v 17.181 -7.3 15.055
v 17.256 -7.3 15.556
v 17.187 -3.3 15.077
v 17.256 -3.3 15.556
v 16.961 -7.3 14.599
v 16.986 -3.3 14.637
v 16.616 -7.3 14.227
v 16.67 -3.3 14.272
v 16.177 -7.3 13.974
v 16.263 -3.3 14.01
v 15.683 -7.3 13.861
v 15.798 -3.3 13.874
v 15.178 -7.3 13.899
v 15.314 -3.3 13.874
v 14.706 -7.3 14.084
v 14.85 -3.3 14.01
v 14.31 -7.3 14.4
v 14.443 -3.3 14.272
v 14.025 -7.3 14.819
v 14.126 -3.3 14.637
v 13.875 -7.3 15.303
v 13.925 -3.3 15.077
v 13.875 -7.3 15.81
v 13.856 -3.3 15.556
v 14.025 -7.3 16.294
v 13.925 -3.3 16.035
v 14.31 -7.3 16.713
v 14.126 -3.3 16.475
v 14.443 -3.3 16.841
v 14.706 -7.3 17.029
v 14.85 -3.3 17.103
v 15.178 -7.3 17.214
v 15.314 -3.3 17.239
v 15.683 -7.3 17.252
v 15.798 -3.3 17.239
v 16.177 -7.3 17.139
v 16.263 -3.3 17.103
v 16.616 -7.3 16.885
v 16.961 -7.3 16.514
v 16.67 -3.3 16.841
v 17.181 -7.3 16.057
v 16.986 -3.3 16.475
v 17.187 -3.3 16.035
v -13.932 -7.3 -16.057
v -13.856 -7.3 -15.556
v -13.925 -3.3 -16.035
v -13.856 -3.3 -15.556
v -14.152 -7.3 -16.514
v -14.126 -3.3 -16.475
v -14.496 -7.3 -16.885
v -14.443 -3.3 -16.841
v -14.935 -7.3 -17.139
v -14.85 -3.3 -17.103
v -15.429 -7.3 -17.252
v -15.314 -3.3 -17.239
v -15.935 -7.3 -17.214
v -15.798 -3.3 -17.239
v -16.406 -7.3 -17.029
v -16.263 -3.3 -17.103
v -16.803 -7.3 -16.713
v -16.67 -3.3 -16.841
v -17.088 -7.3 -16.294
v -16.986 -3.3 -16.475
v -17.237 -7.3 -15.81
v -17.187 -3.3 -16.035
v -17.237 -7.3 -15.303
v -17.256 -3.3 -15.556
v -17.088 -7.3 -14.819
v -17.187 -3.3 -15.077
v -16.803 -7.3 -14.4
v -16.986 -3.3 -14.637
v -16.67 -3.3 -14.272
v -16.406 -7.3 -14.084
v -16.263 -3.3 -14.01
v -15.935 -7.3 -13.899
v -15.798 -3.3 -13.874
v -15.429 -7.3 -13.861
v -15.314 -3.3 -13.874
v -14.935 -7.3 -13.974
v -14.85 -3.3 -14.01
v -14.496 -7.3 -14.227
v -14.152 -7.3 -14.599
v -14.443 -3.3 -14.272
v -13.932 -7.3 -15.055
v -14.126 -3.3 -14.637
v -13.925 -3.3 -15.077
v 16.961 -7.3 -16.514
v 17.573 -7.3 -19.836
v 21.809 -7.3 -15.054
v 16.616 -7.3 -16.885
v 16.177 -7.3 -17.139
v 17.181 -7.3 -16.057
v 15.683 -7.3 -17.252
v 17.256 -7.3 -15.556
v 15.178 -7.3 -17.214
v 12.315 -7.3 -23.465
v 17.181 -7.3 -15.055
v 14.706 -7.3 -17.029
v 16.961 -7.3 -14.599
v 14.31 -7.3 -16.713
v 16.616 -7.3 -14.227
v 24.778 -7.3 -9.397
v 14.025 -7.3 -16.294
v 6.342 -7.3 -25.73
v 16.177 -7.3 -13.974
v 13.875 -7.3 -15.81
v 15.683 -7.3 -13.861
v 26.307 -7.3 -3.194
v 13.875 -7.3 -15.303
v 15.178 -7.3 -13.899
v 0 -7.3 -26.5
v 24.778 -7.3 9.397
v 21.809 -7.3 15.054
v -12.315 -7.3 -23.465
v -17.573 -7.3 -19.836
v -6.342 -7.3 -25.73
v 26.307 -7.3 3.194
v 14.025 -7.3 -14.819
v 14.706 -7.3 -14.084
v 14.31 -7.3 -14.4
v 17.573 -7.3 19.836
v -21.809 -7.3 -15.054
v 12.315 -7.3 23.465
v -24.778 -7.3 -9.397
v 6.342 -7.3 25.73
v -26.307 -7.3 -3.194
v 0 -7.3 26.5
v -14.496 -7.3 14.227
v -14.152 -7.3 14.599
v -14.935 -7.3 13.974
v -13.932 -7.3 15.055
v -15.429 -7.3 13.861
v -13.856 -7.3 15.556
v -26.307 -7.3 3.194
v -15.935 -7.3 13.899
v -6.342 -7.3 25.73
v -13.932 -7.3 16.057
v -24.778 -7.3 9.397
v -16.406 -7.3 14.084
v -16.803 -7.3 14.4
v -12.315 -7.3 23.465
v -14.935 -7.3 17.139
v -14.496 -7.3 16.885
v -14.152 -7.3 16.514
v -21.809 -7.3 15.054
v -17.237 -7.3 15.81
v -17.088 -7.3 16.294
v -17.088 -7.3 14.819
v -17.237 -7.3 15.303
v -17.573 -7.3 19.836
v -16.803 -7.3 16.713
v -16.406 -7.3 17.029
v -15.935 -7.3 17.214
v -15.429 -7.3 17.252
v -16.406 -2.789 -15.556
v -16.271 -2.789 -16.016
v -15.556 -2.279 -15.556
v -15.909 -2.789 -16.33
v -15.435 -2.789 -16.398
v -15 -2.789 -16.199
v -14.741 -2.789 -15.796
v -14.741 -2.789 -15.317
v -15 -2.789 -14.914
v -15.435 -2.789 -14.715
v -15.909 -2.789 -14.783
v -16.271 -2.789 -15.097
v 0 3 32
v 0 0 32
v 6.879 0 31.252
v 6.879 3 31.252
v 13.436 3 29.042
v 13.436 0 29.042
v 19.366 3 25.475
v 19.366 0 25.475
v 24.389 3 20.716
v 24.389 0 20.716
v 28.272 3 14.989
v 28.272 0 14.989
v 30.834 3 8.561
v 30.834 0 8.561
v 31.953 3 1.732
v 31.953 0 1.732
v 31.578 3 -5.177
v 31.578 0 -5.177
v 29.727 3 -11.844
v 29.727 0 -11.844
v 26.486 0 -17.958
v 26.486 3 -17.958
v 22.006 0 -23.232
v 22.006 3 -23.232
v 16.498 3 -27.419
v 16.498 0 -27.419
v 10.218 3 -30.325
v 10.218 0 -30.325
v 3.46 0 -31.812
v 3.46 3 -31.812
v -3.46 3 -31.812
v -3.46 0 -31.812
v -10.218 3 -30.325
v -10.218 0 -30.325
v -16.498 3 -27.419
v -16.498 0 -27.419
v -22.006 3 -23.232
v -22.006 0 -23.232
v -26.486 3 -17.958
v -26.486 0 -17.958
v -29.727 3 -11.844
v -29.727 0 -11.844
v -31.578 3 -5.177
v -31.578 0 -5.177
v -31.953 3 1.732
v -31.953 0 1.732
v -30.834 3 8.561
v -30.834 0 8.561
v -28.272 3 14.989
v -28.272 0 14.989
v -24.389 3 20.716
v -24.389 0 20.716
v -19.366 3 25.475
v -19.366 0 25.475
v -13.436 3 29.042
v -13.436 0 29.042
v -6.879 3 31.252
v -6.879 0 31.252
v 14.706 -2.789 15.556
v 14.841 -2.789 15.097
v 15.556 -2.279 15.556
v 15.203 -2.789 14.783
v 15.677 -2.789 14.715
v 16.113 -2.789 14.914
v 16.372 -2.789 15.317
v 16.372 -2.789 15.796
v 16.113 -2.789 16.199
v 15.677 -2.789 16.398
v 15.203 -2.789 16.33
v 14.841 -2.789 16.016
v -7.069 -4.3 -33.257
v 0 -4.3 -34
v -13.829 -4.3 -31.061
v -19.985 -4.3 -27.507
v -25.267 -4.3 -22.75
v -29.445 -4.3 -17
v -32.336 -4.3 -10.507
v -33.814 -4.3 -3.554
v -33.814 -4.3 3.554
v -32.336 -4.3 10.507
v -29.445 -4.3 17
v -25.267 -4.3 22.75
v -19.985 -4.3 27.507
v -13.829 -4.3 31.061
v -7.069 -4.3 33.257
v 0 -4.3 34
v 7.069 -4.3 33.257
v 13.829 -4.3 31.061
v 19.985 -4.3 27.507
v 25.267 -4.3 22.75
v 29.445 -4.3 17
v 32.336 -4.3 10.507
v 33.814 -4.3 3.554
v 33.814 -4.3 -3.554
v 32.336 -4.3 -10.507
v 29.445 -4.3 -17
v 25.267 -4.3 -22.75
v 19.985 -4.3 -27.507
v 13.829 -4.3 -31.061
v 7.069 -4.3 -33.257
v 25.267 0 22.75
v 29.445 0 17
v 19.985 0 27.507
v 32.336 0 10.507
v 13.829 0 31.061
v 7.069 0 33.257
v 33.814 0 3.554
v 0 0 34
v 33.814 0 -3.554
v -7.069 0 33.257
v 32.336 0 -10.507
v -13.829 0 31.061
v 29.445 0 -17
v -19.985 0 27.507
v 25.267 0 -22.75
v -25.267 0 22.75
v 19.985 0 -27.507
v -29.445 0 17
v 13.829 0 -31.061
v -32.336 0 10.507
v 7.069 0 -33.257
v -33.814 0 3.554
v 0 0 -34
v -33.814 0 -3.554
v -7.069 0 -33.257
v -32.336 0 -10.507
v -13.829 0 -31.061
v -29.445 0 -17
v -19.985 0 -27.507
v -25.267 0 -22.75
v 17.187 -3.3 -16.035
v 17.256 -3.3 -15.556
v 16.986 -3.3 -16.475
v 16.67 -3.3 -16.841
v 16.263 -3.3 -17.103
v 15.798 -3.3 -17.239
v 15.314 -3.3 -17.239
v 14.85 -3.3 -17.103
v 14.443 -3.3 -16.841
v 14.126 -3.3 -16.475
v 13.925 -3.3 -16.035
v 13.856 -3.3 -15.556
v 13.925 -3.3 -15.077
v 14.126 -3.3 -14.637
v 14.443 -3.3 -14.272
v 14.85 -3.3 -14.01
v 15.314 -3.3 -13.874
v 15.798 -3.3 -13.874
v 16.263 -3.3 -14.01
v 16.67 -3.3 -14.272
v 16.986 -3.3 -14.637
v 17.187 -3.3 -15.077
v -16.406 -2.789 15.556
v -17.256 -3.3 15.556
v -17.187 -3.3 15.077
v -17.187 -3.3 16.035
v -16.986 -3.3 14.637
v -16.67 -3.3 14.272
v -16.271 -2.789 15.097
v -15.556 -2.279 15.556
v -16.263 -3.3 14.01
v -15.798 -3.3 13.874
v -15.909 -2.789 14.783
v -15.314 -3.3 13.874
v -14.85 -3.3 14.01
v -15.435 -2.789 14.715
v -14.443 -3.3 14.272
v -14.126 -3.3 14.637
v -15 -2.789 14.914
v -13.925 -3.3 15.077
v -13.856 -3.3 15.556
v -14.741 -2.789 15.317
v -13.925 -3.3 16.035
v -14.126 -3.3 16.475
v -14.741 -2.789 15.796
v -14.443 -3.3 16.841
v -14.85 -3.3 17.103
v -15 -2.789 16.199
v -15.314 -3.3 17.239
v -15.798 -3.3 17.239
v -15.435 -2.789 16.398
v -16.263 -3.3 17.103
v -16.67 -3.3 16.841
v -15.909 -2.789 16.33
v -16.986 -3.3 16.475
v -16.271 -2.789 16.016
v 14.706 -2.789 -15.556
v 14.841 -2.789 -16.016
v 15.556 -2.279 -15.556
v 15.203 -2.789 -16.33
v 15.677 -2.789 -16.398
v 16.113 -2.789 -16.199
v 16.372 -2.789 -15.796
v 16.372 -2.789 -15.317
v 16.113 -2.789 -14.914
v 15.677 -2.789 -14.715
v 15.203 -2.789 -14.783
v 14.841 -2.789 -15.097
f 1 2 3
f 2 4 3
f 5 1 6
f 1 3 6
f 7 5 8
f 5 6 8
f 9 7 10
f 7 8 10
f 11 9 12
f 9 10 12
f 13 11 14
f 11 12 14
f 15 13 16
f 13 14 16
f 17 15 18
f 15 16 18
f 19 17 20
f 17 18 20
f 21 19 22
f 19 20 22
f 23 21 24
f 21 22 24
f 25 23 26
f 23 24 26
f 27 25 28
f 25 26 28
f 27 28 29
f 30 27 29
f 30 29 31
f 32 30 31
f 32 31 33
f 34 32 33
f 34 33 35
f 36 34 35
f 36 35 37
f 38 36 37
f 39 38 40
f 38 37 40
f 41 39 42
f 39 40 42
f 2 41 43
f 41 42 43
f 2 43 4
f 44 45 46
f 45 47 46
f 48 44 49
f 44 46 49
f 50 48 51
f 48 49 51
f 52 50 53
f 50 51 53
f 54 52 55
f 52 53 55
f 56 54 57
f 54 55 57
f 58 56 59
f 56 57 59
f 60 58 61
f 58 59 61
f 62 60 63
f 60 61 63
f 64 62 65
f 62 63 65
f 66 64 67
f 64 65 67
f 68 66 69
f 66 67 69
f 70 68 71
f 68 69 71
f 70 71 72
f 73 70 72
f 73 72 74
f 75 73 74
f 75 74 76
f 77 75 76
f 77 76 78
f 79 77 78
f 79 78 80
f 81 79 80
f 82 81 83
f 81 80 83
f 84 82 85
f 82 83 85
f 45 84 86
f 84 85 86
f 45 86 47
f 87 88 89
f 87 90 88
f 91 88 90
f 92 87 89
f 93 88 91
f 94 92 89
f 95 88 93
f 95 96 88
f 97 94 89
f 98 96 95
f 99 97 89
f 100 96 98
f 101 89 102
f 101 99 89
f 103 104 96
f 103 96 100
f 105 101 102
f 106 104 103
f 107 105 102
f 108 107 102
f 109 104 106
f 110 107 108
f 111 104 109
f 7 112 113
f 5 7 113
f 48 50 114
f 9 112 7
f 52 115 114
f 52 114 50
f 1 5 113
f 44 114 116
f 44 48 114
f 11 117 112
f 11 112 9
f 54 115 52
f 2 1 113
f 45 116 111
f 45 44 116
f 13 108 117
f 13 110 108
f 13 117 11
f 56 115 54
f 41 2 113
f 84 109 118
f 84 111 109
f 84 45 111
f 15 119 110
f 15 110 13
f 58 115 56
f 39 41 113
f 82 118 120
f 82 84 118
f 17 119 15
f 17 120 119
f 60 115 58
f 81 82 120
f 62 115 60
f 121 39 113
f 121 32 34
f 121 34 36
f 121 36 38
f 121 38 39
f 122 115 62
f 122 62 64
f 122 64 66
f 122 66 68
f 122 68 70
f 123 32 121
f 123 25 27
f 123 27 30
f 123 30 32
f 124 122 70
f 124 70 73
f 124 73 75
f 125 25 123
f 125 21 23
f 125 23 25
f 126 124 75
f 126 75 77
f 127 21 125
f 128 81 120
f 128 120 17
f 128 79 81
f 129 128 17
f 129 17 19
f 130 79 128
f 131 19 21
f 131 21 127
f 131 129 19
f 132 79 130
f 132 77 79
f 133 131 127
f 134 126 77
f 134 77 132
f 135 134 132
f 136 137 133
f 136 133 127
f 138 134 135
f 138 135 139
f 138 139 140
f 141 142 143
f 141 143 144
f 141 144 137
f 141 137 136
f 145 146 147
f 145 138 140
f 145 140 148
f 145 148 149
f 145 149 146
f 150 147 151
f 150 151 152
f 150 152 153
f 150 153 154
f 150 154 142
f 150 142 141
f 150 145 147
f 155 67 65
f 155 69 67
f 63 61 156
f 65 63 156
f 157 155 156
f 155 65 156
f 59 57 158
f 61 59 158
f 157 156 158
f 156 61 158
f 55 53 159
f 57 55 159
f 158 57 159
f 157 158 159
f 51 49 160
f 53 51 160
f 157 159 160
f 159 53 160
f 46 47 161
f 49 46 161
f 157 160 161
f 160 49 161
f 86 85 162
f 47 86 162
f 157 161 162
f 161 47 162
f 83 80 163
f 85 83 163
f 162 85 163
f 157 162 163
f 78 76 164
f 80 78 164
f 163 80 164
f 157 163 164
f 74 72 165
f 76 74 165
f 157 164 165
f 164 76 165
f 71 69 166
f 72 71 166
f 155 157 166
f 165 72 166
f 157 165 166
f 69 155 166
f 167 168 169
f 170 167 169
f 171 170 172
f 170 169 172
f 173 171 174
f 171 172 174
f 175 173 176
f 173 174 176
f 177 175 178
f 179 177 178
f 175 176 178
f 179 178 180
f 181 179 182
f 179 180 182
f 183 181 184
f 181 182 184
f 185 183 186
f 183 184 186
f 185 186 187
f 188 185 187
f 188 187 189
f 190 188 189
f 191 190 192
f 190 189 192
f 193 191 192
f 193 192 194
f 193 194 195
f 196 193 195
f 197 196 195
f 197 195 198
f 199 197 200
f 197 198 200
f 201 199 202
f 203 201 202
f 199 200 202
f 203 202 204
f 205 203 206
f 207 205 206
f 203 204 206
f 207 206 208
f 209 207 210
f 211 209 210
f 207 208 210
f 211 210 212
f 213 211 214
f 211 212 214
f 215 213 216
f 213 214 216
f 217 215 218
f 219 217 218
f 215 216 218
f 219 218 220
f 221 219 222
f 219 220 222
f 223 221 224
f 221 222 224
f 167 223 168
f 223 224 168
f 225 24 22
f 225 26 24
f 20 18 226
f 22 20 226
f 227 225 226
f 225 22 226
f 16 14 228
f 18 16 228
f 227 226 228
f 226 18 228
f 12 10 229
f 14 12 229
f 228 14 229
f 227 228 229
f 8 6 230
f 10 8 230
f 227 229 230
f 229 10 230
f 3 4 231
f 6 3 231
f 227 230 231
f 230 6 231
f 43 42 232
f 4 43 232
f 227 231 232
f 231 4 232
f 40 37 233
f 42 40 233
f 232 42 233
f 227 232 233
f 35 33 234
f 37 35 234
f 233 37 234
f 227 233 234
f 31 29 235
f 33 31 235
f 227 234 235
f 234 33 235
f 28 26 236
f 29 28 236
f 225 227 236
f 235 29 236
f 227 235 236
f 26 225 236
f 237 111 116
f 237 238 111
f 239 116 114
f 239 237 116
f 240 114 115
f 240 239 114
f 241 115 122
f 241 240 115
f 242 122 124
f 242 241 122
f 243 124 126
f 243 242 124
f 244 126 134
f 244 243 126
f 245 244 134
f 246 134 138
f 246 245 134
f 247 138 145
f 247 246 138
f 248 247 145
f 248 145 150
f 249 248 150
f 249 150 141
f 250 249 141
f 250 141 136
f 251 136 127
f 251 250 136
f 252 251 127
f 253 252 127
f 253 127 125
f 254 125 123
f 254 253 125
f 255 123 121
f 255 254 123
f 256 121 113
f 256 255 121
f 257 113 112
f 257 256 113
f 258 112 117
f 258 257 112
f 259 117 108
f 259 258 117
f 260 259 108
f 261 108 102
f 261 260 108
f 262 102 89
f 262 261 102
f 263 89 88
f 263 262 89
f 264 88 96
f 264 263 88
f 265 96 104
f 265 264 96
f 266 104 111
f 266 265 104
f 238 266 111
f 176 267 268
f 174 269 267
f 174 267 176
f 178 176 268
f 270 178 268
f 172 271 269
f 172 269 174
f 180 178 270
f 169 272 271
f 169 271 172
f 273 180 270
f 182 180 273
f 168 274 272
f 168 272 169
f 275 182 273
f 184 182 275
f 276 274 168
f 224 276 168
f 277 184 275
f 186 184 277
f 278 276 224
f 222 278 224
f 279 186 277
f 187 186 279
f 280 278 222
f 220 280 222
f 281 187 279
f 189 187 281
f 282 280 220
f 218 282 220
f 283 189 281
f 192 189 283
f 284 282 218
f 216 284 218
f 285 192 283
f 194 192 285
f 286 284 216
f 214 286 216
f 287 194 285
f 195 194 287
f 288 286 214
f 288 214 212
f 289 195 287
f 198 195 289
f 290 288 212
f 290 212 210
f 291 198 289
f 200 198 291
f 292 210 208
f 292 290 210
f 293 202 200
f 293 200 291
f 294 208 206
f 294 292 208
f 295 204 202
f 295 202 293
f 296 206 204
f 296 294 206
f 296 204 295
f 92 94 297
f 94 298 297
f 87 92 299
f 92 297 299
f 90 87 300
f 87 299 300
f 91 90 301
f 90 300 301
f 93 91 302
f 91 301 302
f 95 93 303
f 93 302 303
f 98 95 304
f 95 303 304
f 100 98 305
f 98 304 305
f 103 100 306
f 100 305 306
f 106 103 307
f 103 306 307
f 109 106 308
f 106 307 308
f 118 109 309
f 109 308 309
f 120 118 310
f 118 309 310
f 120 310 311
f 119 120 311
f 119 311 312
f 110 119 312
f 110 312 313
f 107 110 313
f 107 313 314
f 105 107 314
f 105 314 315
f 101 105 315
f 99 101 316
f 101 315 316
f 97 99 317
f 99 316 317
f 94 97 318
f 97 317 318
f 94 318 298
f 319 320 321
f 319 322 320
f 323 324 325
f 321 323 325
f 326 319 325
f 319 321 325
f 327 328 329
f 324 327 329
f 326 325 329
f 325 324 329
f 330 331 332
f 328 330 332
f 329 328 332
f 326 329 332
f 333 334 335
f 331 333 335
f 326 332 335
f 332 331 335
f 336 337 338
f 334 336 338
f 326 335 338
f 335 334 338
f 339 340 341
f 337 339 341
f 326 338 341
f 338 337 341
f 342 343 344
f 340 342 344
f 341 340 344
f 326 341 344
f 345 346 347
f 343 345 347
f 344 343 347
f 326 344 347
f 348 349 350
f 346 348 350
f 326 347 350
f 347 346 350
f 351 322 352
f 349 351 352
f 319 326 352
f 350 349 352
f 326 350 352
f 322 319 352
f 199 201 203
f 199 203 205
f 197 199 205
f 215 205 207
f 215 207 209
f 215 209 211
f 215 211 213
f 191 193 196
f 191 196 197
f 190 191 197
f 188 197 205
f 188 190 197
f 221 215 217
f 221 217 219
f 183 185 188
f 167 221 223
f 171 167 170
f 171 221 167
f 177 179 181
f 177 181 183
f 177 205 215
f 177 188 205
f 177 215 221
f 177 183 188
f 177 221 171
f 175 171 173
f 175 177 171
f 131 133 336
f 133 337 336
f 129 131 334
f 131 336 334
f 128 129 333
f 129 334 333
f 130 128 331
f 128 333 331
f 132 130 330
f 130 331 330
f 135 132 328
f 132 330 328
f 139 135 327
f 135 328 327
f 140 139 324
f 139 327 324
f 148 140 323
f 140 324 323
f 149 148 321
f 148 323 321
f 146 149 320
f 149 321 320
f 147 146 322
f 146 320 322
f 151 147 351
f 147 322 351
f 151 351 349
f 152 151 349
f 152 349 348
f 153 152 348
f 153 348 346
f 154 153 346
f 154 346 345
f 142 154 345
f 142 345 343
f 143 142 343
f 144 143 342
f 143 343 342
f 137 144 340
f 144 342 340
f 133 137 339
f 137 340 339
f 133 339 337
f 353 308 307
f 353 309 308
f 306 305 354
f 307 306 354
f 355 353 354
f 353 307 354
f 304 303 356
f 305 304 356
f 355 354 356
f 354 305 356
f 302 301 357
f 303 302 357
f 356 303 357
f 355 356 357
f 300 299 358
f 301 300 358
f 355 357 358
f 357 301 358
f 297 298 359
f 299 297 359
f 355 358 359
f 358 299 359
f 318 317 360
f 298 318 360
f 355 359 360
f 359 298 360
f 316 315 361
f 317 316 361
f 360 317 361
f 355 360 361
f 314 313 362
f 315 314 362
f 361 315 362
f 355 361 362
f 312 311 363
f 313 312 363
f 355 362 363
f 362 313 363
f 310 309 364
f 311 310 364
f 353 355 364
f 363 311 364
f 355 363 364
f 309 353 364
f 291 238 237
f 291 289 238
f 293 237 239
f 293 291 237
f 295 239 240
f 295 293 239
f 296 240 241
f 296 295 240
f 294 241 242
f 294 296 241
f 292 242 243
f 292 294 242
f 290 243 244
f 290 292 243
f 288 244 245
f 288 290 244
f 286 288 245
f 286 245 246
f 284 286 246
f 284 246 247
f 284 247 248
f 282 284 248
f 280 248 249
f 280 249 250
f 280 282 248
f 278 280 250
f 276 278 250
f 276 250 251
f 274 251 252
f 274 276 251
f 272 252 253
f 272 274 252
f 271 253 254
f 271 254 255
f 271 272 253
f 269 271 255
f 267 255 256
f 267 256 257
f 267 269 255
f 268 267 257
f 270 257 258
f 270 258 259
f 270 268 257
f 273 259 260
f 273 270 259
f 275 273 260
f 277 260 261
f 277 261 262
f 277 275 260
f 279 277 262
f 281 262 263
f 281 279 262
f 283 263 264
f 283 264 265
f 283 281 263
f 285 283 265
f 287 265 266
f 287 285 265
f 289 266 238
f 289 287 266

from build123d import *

# Parameters (mm, degrees)
SKETCH2_R                = 32
BOSS_EXTRUDE1_DEPTH      = 3
M3_CLEARANCE_HOLE1_D     = 3.4
M3_CLEARANCE_HOLE1_DEPTH = 4
M3_CLEARANCE_HOLE1_TIP   = 1.021463052


with BuildPart() as part:
    # Sketch1 → Revolve1 (revolve)
    with BuildSketch(Plane.XY, mode=Mode.PRIVATE) as revolve1_sk:
        Polygon((-26.5, -7.3), (-34, -4.3), (-34, 0), (0, 0), (0, -7.3), align=None)
    revolve(revolve1_sk.sketch.rotate(Axis((0, -7.3, 0), (0, 1, 0)), 270), axis=Axis((0, -7.3, 0), (0, 1, 0)))

    # Sketch2 → Boss-Extrude1 (add)
    with BuildSketch(Plane(origin=(0, 0, 0), x_dir=(1, 0, 0), z_dir=(0, 1, 0))):
        with Locations(Location((0, 0, 0), (0, 0, 270))):
            Circle(SKETCH2_R)
    extrude(amount=BOSS_EXTRUDE1_DEPTH)

    # M3 Clearance Hole1
    with Locations(Plane(origin=(0, -7.3, 0), x_dir=(-1, 0, 0), z_dir=(0, -1, 0))):
        with Locations((15.556349186, -15.556349186), (15.556349186, 15.556349186), (-15.556349186, 15.556349186), (-15.556349186, -15.556349186)):
            Hole(M3_CLEARANCE_HOLE1_D / 2, depth=M3_CLEARANCE_HOLE1_DEPTH)
            with Locations((0, 0, -(M3_CLEARANCE_HOLE1_DEPTH + M3_CLEARANCE_HOLE1_TIP / 2))):  # 118° drill point
                Cone(0, M3_CLEARANCE_HOLE1_D / 2, M3_CLEARANCE_HOLE1_TIP, mode=Mode.SUBTRACT)


solid = part.part
